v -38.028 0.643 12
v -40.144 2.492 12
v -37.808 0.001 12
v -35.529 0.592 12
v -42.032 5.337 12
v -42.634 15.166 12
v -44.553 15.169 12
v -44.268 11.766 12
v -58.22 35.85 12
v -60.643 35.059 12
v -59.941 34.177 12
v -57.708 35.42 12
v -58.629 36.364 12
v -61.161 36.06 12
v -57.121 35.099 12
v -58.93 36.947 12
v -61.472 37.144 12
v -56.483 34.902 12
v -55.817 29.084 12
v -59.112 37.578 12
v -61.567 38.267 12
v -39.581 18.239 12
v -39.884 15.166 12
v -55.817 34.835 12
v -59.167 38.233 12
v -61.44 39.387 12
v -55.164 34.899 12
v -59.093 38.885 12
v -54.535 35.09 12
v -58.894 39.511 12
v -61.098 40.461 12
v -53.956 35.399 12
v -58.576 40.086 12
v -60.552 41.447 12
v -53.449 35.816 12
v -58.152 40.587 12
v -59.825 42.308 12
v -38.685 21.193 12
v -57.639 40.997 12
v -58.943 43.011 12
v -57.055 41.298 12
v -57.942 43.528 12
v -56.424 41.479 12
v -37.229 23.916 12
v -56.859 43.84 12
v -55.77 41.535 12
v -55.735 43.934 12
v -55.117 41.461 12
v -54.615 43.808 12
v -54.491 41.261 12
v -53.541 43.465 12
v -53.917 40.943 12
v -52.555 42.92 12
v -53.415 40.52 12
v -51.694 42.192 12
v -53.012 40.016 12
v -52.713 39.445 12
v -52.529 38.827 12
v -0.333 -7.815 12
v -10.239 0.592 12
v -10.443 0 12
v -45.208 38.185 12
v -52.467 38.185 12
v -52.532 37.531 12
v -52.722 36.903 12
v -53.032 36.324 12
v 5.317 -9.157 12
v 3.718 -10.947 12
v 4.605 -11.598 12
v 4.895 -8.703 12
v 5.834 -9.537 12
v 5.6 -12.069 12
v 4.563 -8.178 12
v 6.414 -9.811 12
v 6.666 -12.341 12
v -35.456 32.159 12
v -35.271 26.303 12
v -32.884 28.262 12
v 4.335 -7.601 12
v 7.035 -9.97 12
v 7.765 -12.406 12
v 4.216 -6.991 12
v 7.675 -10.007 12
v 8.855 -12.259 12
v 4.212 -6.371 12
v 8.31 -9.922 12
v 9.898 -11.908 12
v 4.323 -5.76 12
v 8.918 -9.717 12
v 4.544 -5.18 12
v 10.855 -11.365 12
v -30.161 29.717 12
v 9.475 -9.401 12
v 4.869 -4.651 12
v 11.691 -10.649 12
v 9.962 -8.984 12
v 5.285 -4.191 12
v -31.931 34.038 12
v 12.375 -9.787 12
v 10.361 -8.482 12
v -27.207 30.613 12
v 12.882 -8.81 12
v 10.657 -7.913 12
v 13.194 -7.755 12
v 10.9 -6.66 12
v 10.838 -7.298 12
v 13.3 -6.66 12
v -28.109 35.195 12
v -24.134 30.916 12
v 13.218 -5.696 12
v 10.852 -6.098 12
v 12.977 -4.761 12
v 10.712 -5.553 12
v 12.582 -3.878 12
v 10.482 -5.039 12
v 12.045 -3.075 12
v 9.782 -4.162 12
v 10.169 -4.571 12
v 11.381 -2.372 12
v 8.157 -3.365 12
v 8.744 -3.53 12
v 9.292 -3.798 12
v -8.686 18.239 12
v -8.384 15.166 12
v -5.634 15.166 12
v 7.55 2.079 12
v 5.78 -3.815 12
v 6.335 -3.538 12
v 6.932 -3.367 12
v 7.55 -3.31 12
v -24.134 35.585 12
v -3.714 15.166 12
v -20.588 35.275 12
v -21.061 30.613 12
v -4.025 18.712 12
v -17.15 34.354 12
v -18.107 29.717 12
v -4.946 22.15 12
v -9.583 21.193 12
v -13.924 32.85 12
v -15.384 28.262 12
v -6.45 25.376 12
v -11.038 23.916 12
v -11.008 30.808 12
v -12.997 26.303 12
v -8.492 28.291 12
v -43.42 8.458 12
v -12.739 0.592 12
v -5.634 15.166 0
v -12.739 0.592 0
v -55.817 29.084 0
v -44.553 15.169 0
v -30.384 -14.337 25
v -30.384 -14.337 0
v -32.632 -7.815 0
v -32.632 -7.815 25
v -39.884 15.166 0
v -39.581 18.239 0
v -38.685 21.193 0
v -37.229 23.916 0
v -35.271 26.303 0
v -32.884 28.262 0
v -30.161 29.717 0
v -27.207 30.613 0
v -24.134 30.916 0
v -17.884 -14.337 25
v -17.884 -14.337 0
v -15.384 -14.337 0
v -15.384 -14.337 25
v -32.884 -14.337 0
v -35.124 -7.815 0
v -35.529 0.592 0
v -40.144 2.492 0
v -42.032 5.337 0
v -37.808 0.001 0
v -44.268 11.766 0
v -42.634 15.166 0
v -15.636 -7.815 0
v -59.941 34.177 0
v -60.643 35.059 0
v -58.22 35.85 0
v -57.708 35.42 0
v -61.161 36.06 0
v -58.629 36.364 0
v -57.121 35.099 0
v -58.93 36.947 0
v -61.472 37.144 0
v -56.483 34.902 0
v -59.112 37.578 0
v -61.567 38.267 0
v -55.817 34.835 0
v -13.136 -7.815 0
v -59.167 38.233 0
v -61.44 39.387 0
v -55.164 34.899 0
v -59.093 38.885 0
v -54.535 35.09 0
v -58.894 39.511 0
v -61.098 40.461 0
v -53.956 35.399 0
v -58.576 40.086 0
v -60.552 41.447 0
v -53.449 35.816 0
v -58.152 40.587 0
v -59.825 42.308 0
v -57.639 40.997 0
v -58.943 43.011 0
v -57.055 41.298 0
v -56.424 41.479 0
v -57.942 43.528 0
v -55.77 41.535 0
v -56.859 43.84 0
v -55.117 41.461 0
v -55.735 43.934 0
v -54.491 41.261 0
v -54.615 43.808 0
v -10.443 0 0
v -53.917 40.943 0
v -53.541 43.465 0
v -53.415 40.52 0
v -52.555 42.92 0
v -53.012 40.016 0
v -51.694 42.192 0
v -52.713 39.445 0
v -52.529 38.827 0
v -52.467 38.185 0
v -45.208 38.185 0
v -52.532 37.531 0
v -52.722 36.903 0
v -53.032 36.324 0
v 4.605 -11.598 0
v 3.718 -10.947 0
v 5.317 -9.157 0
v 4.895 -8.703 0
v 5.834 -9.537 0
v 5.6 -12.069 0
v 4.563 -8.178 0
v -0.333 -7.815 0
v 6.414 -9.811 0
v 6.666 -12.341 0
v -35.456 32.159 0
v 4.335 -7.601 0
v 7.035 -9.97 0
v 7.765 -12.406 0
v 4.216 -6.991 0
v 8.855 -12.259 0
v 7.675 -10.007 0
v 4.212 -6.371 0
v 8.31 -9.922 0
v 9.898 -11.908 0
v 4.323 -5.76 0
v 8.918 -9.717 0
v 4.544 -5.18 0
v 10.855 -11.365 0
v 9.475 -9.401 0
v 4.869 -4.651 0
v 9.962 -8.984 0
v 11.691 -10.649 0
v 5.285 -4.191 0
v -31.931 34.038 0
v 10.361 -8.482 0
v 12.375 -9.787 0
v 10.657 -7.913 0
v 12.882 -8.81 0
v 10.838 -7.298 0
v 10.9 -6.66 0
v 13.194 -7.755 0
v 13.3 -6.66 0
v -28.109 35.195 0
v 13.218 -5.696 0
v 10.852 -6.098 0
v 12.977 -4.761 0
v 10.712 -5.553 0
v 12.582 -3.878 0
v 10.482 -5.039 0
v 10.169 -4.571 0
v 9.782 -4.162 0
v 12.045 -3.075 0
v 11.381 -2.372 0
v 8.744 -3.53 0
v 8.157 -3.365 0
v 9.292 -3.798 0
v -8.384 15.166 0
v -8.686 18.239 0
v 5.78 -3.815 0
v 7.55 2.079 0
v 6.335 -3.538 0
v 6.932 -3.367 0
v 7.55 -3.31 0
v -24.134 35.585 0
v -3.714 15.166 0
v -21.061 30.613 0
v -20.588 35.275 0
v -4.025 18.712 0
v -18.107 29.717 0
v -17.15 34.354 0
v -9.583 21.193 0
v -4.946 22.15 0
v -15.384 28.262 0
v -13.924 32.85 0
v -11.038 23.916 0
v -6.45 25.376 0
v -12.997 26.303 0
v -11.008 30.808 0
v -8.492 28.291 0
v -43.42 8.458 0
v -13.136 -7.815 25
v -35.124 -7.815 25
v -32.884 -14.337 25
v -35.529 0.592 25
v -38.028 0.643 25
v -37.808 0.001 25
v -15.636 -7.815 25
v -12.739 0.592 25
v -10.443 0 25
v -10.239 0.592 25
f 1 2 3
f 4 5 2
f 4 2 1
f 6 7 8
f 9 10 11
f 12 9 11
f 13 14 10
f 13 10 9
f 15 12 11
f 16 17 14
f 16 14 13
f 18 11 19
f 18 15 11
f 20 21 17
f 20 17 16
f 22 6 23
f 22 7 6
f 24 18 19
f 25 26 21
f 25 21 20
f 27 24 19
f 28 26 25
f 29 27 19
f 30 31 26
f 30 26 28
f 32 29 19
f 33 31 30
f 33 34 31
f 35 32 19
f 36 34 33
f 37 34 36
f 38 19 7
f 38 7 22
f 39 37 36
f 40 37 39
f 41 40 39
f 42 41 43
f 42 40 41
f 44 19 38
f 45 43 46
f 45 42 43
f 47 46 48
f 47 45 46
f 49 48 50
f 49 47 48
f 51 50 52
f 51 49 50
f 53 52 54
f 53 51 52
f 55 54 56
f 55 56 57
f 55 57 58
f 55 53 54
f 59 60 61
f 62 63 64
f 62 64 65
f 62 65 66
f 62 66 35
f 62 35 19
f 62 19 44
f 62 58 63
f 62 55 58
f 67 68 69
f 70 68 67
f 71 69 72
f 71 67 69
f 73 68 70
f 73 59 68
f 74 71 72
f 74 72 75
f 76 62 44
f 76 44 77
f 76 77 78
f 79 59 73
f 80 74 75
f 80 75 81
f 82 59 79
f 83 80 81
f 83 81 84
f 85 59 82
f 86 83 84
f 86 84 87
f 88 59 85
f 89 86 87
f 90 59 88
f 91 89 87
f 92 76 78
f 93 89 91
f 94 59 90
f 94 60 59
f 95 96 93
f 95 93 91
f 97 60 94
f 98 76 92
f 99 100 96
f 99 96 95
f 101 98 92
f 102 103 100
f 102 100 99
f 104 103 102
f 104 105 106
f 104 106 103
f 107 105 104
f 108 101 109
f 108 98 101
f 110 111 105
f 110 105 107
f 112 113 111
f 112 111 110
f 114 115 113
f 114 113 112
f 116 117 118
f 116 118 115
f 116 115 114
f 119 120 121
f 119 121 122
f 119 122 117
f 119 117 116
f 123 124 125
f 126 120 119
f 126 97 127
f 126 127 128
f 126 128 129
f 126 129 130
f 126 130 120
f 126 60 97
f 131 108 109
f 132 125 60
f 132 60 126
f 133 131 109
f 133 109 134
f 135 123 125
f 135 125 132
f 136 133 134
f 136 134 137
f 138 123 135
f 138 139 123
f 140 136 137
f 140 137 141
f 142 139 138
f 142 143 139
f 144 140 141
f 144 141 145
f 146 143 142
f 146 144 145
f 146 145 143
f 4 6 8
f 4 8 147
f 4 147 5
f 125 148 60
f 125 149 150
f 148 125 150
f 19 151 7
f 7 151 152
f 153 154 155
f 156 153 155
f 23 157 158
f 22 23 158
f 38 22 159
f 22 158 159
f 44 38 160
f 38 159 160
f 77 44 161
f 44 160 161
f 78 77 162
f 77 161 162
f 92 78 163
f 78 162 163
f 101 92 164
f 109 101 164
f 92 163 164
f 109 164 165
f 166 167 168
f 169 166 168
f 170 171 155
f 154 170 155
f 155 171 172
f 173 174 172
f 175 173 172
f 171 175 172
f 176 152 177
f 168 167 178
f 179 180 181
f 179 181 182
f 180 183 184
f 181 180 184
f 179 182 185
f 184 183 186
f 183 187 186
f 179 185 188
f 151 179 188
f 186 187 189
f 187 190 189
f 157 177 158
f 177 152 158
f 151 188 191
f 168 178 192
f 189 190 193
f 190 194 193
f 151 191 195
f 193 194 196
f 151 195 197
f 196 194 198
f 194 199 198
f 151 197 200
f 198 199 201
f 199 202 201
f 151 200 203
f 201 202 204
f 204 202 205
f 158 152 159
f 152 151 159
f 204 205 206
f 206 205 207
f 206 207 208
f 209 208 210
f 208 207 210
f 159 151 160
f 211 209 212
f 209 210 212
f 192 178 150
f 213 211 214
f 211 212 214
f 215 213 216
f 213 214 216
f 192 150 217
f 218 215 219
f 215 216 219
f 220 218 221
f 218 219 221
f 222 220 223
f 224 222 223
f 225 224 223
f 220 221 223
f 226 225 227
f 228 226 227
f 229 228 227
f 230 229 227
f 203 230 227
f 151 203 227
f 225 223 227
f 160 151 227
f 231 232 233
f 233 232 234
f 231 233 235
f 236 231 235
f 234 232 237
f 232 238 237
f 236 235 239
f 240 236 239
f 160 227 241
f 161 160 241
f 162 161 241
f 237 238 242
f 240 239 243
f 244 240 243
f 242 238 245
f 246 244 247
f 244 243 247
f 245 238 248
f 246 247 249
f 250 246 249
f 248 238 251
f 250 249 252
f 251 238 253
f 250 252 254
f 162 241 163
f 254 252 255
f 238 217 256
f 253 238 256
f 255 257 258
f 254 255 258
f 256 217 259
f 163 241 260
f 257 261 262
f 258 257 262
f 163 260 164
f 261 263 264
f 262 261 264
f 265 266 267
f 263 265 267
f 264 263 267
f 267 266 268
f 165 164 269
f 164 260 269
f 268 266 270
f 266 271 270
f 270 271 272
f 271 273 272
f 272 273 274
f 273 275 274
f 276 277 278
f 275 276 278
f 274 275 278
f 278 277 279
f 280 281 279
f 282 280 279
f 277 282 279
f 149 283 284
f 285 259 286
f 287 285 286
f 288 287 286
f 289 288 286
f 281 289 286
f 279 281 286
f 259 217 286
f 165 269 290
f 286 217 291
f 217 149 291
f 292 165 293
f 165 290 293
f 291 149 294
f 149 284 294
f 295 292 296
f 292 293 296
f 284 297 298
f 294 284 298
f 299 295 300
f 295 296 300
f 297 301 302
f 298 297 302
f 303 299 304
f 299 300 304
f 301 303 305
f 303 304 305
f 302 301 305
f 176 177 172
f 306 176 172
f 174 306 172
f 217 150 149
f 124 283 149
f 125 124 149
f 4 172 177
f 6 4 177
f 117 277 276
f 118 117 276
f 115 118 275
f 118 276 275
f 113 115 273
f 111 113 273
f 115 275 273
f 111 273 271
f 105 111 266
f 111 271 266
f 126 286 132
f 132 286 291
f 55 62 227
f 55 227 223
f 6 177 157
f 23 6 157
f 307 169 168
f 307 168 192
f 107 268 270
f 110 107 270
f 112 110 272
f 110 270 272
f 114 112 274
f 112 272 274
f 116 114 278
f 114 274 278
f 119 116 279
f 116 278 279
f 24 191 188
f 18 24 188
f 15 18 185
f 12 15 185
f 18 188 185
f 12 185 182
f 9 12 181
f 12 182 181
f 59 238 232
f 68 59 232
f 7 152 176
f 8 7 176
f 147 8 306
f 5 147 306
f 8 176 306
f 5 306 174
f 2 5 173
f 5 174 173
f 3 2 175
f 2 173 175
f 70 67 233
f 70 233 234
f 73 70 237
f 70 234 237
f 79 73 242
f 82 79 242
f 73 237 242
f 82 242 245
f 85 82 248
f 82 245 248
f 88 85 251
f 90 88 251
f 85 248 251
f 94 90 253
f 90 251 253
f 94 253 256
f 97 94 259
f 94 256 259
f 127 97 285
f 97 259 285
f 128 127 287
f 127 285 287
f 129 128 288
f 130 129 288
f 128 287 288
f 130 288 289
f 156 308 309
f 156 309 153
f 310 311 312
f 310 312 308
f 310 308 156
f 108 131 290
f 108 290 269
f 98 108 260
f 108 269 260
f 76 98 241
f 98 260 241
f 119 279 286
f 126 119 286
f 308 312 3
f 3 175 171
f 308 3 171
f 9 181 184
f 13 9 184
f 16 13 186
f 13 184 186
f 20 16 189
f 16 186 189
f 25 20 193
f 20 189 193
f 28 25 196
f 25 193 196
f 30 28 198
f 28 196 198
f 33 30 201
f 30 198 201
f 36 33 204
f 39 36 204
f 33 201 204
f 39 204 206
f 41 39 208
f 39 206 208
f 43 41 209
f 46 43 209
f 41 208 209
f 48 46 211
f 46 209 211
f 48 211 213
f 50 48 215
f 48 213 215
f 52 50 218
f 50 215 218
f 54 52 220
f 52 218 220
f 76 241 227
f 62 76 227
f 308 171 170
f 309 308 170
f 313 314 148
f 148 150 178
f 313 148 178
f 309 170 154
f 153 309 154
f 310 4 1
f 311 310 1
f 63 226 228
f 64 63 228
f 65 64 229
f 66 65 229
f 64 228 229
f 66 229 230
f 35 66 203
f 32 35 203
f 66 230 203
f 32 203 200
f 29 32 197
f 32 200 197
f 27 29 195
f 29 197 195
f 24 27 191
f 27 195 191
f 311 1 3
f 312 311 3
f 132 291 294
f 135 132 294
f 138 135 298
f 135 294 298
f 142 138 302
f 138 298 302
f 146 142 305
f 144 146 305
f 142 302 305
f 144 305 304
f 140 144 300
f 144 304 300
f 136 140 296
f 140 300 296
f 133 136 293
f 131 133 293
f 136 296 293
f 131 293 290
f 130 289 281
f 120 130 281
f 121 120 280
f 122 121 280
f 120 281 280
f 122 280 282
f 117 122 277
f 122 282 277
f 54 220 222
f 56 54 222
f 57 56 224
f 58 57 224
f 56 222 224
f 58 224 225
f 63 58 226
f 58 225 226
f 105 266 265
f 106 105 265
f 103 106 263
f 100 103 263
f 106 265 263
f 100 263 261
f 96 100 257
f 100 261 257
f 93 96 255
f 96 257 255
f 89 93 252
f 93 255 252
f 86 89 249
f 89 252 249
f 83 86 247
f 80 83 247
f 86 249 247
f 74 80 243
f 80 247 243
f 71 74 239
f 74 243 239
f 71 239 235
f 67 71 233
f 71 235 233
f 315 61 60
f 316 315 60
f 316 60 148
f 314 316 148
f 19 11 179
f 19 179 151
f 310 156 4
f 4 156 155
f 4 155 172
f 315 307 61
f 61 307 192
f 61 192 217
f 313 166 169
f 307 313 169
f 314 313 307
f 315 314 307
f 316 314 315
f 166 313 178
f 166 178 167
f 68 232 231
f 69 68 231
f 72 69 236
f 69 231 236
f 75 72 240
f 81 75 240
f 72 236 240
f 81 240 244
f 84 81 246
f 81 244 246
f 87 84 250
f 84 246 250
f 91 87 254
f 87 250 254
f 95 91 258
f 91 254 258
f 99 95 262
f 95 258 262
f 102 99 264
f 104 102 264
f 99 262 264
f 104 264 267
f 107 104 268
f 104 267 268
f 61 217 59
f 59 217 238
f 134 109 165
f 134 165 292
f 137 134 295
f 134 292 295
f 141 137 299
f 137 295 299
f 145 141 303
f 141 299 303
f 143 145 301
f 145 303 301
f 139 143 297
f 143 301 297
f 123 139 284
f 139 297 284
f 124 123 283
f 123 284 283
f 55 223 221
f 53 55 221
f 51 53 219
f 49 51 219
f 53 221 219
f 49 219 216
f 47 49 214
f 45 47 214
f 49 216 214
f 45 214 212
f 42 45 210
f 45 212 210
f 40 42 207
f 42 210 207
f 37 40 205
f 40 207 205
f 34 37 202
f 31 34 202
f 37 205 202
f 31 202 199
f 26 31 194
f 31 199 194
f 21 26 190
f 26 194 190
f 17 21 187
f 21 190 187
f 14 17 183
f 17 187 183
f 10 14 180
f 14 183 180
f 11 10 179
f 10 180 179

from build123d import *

# Parameters (mm, degrees)
F1_DEPTH = 12
F2_DEPTH = 25


# Not quite as in the source:
# - ends of sketch curves that miss each other by under 0.0002 mm in the source are joined


with BuildPart() as f1:
    # F0 (on Top) → F1 (new body)
    with BuildSketch(Plane.XY):
        with BuildLine():
            Line((-45.2079510631, 38.1848650801), (-50.0674114416, 38.1848649627))
            ThreePointArc((-50.0674114416, 38.1848649627), (-51.7515474497, 34.119000832), (-55.8174114415, 32.4348648238))
            Line((-55.8174114415, 32.4348648238), (-55.8174114414, 29.083605512))
            Line((-55.8174114414, 29.083605512), (-44.5532578407, 15.1687110318))
            ThreePointArc((-44.5532578407, 15.1687110318), (-42.1350647352, 24.8048651036), (-35.4555304308, 32.1592477879))
            Line((-35.4555304308, 32.1592477879), (-45.2079510631, 38.1848650801))
        make_face()
        with BuildLine():
            Line((-50.0674114416, 38.1848649627), (-52.4674114416, 38.1848649047))
            ThreePointArc((-52.4674114416, 38.1848649047), (-53.4486037246, 35.8160571069), (-55.8174114415, 34.8348648238))
            Line((-55.8174114415, 34.8348648238), (-55.8174114415, 32.4348648238))
            ThreePointArc((-55.8174114415, 32.4348648238), (-51.7515474497, 34.119000832), (-50.0674114416, 38.1848649627))
        make_face()
        with BuildLine():
            Line((-55.8174114414, 29.083605512), (-55.8174114415, 32.4348648238))
            ThreePointArc((-55.8174114415, 32.4348648238), (-58.0556968865, 32.8883963526), (-59.9408925855, 34.1774462962))
            Line((-59.9408925855, 34.1774462962), (-55.8174114414, 29.083605512))
        make_face()
        with BuildLine():
            Line((-55.8174114415, 32.4348648238), (-55.8174114415, 34.8348648238))
            ThreePointArc((-55.8174114415, 34.8348648238), (-57.1214560051, 35.0990962362), (-58.2197874124, 35.8501079425))
            Line((-58.2197874124, 35.8501079425), (-59.9408925855, 34.1774462962))
            ThreePointArc((-59.9408925855, 34.1774462962), (-58.0556968865, 32.8883963526), (-55.8174114415, 32.4348648238))
        make_face()
        with BuildLine():
            ThreePointArc((-58.2197874124, 35.8501079425), (-58.1521683229, 40.5872407946), (-53.4150354708, 40.5196217052))
            Line((-53.4150354708, 40.5196217052), (-51.6939302977, 42.1922833515))
            ThreePointArc((-51.6939302977, 42.1922833515), (-59.8248299692, 42.3083459677), (-59.9408925855, 34.1774462962))
            Line((-59.9408925855, 34.1774462962), (-58.2197874124, 35.8501079425))
        make_face()
        with BuildLine():
            ThreePointArc((-53.4150354708, 40.5196217052), (-52.7133447942, 39.4447339634), (-52.4674114416, 38.1848648238))
            Line((-52.4674114416, 38.1848648238), (-50.0674114416, 38.1848649627))
            ThreePointArc((-50.0674114416, 38.1848649627), (-50.4895358529, 40.3473267799), (-51.6939302977, 42.1922833515))
            Line((-51.6939302977, 42.1922833515), (-53.4150354708, 40.5196217052))
        make_face()
        with BuildLine():
            ThreePointArc((-51.6939302977, 42.1922833515), (-50.4895358529, 40.3473267799), (-50.0674114416, 38.1848648238))
            Line((-50.0674114416, 38.1848648238), (-45.2079510631, 38.1848650801))
            Line((-45.2079510631, 38.1848650801), (-51.6939302977, 42.1922833515))
        make_face()
        with BuildLine():
            ThreePointArc((-24.1338443596, 35.5853722206), (-30.0482104313, 34.7100811604), (-35.4555304308, 32.1592477879))
            ThreePointArc((-35.4555304308, 32.1592477879), (-42.1350647352, 24.8048651036), (-44.5532578407, 15.1687110318))
            Line((-44.5532578407, 15.1687110318), (-42.6338443592, 15.1659585535))
            Line((-42.6338443592, 15.1659585535), (-39.8838443592, 15.1659585535))
            ThreePointArc((-39.8838443592, 15.1659585535), (-35.270776163, 26.3028903571), (-24.1338443595, 30.9159585535))
            Line((-24.1338443595, 30.9159585535), (-24.1338443596, 35.5853722206))
        make_face()
        with BuildLine():
            ThreePointArc((-3.7144306922, 15.1659585535), (-9.6951384875, 29.6046644255), (-24.1338443596, 35.5853722206))
            Line((-24.1338443596, 35.5853722206), (-24.1338443595, 30.9159585535))
            ThreePointArc((-24.1338443595, 30.9159585535), (-12.9969125556, 26.3028903573), (-8.3838443592, 15.1659585535))
            Line((-8.3838443592, 15.1659585535), (-5.6338443592, 15.1659585535))
            Line((-5.6338443592, 15.1659585535), (-3.7144306922, 15.1659585535))
        make_face()
        with BuildLine():
            Line((-42.6338443592, 15.1659585535), (-44.5532578407, 15.1687110318))
            ThreePointArc((-44.5532578407, 15.1687110318), (-42.7914410163, 6.8685769492), (-37.807970261, 0.0011725238))
            Line((-37.807970261, 0.0011725238), (-38.0284454354, 0.643162408))
            Line((-38.0284454354, 0.643162408), (-35.5289696075, 0.5919707473))
            Line((-35.5289696075, 0.5919707473), (-42.6338443592, 15.1659585535))
        make_face()
        Polygon((-38.0284454354, 0.643162408), (-37.807970261, 0.0011725238), (-35.1236572441, -7.8151351762), (-32.6315665225, -7.8151351762), (-35.5289696075, 0.5919707473), align=None)
        Polygon((-32.6315665225, -7.8151351762), (-35.1236572441, -7.8151351762), (-32.8838443592, -14.3371266833), (-30.3838443592, -14.3371266833), align=None)
        Polygon((-13.136122196, -7.8151351762), (-15.636122196, -7.8151351762), (-17.8838443592, -14.3371266833), (-15.3838443592, -14.3371266833), align=None)
        Polygon((-10.2387191109, 0.5919707473), (-12.7387191109, 0.5919707473), (-15.636122196, -7.8151351762), (-13.136122196, -7.8151351762), (-10.4427343672, 0), align=None)
        with BuildLine():
            Line((7.5497227229, 2.079326472), (-3.7144306922, 15.1659585535))
            Line((-3.7144306922, 15.1659585535), (-5.6338443592, 15.1659585535))
            Line((-5.6338443592, 15.1659585535), (-12.7387191109, 0.5919707473))
            Line((-12.7387191109, 0.5919707473), (-10.2387191109, 0.5919707473))
            Line((-10.2387191109, 0.5919707473), (-10.4427343672, 0))
            Line((-10.4427343672, 0), (-0.3331204375, -7.8151351762))
            Line((-0.3331204375, -7.8151351762), (1.9170354556, -7.8151351762))
            ThreePointArc((1.9170354556, -7.8151351762), (3.0939956275, -3.0251503303), (7.549722723, -0.909568585))
            Line((7.549722723, -0.909568585), (7.5497227229, 2.079326472))
        make_face()
        with BuildLine():
            ThreePointArc((13.2997227231, -6.659568585), (12.7982725871, -4.3111171112), (11.3813838275, -2.3722765282))
            Line((11.3813838275, -2.3722765282), (9.7820818013, -4.1617549519))
            ThreePointArc((9.7820818013, -4.1617549519), (10.6075735134, -5.2913403351), (10.8997227231, -6.659568585))
            ThreePointArc((10.8997227231, -6.659568585), (8.917950973, -9.7174193754), (5.3173636448, -9.1573822181))
            Line((5.3173636448, -9.1573822181), (3.7180616186, -10.9468606418))
            ThreePointArc((3.7180616186, -10.9468606418), (9.8981741968, -11.908118449), (13.2997227231, -6.659568585))
        make_face()
        with BuildLine():
            ThreePointArc((11.3813838275, -2.3722765282), (9.6004019609, -1.2876774223), (7.549722723, -0.909568585))
            Line((7.549722723, -0.909568585), (7.549722723, -3.309568585))
            ThreePointArc((7.549722723, -3.309568585), (8.744466279, -3.5298580815), (9.7820818013, -4.1617549519))
            Line((9.7820818013, -4.1617549519), (11.3813838275, -2.3722765282))
        make_face()
        with BuildLine():
            Line((7.549722723, -3.309568585), (7.549722723, -0.909568585))
            ThreePointArc((7.549722723, -0.909568585), (3.0939956275, -3.0251503303), (1.9170354556, -7.8151351762))
            ThreePointArc((1.9170354556, -7.8151351762), (2.5652068364, -9.5261172721), (3.7180616186, -10.9468606418))
            Line((3.7180616186, -10.9468606418), (5.3173636448, -9.1573822181))
            ThreePointArc((5.3173636448, -9.1573822181), (4.4200122196, -5.464825029), (7.549722723, -3.309568585))
        make_face()
        with BuildLine():
            ThreePointArc((3.7180616186, -10.9468606418), (2.5652068364, -9.5261172721), (1.9170354556, -7.8151351762))
            Line((1.9170354556, -7.8151351762), (-0.3331204375, -7.8151351762))
            Line((-0.3331204375, -7.8151351762), (3.7180616186, -10.9468606418))
        make_face()
        with BuildLine():
            Line((11.3813838275, -2.3722765282), (7.5497227229, 2.079326472))
            Line((7.5497227229, 2.079326472), (7.549722723, -0.909568585))
            ThreePointArc((7.549722723, -0.909568585), (9.6004019609, -1.2876774223), (11.3813838275, -2.3722765282))
        make_face()
    extrude(amount=F1_DEPTH)

    # F0 (on Top) → F2 (join)
    with BuildSketch(Plane.XY):
        Polygon((-38.0284454354, 0.643162408), (-37.807970261, 0.0011725238), (-35.1236572441, -7.8151351762), (-32.6315665225, -7.8151351762), (-35.5289696075, 0.5919707473), align=None)
        Polygon((-32.6315665225, -7.8151351762), (-35.1236572441, -7.8151351762), (-32.8838443592, -14.3371266833), (-30.3838443592, -14.3371266833), align=None)
        Polygon((-13.136122196, -7.8151351762), (-15.636122196, -7.8151351762), (-17.8838443592, -14.3371266833), (-15.3838443592, -14.3371266833), align=None)
        Polygon((-10.2387191109, 0.5919707473), (-12.7387191109, 0.5919707473), (-15.636122196, -7.8151351762), (-13.136122196, -7.8151351762), (-10.4427343672, 0), align=None)
    extrude(amount=F2_DEPTH)


solid = f1.part
